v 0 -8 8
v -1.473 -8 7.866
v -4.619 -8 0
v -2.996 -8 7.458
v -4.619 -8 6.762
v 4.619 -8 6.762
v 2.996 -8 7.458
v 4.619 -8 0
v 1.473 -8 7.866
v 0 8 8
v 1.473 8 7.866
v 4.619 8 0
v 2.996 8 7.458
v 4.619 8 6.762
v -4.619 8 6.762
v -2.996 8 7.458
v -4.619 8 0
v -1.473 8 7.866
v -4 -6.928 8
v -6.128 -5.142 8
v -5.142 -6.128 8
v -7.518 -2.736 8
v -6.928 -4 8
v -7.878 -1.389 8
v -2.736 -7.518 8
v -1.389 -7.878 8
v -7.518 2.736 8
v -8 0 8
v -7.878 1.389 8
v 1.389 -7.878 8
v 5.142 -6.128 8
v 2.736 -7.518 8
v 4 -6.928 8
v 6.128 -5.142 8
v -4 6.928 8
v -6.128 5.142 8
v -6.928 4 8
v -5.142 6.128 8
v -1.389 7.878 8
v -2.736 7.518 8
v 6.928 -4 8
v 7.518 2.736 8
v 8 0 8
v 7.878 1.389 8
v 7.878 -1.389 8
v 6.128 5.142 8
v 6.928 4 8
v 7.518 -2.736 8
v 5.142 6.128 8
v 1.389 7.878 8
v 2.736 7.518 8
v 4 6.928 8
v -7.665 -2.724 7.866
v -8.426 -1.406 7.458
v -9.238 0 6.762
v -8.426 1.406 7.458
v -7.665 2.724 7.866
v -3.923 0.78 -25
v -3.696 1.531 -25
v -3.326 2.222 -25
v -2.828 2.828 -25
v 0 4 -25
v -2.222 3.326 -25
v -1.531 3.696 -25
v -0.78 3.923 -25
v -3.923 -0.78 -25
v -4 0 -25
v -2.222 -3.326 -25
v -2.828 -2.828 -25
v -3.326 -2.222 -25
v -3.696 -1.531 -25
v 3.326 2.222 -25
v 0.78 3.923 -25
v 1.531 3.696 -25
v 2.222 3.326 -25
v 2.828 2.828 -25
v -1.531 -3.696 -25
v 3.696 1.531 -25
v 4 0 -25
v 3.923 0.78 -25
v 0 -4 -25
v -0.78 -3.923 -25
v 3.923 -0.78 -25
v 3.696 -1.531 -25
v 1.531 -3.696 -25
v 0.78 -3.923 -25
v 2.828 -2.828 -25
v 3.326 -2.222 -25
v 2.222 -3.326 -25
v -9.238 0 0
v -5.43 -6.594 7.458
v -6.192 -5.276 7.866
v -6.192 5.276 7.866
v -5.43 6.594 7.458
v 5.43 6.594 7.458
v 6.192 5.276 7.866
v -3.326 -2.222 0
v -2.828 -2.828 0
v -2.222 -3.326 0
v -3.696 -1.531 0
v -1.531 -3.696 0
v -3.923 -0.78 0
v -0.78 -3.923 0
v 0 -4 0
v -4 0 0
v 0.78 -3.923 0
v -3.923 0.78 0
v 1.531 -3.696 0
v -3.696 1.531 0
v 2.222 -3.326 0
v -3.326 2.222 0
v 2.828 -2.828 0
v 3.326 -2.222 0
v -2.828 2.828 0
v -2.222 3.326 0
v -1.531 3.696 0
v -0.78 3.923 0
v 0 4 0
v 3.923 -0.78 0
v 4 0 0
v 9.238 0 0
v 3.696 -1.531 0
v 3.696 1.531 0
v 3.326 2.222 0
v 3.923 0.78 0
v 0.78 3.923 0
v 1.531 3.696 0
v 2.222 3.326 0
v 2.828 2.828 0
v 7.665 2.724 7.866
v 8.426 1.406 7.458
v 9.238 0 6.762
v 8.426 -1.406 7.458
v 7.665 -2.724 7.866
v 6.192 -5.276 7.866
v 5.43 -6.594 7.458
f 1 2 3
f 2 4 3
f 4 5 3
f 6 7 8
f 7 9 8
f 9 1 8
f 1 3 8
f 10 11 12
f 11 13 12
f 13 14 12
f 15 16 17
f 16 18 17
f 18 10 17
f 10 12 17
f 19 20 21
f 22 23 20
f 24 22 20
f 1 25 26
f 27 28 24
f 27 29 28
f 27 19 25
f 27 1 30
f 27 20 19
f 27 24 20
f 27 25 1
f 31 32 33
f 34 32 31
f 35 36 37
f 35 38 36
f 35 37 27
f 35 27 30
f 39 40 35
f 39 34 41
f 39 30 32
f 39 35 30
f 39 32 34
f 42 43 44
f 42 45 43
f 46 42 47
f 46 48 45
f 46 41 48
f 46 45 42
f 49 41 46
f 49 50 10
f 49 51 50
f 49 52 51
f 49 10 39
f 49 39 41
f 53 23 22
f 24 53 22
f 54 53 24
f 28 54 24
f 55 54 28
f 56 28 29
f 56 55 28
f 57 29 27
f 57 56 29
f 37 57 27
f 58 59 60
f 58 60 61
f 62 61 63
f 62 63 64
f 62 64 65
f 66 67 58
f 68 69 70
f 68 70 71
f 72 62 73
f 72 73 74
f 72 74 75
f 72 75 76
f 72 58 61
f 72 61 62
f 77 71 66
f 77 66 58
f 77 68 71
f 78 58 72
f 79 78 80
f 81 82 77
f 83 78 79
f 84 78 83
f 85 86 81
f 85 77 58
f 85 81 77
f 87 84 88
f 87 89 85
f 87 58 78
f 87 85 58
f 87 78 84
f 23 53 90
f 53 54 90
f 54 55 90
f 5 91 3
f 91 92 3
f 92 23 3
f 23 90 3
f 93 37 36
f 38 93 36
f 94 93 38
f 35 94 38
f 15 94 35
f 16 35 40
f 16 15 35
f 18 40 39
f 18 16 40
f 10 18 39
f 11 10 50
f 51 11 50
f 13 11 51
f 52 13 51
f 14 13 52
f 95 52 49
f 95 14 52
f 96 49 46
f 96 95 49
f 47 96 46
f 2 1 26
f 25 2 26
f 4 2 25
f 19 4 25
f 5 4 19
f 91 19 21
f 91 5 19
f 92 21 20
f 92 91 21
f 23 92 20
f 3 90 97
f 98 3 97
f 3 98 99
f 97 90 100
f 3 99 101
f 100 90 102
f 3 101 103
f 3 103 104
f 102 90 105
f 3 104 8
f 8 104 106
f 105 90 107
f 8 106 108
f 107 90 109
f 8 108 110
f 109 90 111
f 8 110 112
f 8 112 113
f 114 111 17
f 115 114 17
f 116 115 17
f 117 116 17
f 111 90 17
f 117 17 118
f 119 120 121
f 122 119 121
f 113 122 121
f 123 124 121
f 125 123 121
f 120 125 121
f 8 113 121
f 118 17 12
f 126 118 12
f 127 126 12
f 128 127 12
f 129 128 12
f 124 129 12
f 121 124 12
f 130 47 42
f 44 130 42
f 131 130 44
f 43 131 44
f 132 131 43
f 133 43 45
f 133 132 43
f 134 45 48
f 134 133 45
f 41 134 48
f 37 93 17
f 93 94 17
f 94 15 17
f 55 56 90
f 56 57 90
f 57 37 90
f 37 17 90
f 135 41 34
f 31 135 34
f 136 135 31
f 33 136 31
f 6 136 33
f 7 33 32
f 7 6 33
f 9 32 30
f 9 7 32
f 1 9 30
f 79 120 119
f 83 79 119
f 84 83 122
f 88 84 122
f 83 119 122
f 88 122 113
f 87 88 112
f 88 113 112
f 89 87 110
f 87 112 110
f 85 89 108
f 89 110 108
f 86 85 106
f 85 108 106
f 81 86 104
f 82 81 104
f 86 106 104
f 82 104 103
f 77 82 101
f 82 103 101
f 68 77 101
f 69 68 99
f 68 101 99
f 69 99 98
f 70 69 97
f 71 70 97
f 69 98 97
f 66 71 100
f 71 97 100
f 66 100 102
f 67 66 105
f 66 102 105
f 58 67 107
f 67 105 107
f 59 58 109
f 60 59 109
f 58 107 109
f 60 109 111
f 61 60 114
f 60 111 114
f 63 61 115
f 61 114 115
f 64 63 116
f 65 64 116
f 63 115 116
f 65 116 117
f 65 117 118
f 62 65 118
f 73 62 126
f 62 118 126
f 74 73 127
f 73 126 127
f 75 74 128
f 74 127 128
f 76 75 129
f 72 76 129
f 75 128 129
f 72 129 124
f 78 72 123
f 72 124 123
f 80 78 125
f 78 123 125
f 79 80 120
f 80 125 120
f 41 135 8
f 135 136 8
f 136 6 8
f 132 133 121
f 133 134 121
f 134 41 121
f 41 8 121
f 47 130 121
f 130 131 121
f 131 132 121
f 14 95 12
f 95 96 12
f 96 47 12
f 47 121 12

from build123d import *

# Parameters (mm, degrees)
BOSS_EXTRUDE1_DEPTH = 8
SKETCH2_OUTSIDE_W   = 41.62
SKETCH2_OUTSIDE_H   = 39.144
SKETCH2_OUTSIDE_R   = 8
CUT_EXTRUDE1_DEPTH  = 8
CUT_EXTRUDE1_TAPER  = 45
SKETCH3_R           = 4
BOSS_EXTRUDE2_DEPTH = 25


with BuildPart() as part:
    # Sketch1 → Boss-Extrude1 (new body)
    with BuildSketch(Plane.XY):
        Polygon((9.237604307, 0), (4.618802154, 8), (-4.618802154, 8), (-9.237604307, 0), (-4.618802154, -8), (4.618802154, -8), align=None)
    extrude(amount=BOSS_EXTRUDE1_DEPTH)

    # Sketch2 outside → Cut-Extrude1 (cut)
    with BuildSketch(Plane.XY.offset(8)):
        Rectangle(SKETCH2_OUTSIDE_W, SKETCH2_OUTSIDE_H)
        Circle(SKETCH2_OUTSIDE_R, mode=Mode.SUBTRACT)
    extrude(amount=-CUT_EXTRUDE1_DEPTH, taper=CUT_EXTRUDE1_TAPER, mode=Mode.SUBTRACT)

    # Sketch3 → Boss-Extrude2 (add)
    with BuildSketch(Plane(origin=(0, 0, 0), x_dir=(-1, 0, 0), z_dir=(0, 0, -1))):
        with Locations(Location((0, 0, 0), (0, 0, 180))):  # turned: the seam where the file's is
            Circle(SKETCH3_R)
    extrude(amount=BOSS_EXTRUDE2_DEPTH)


solid = part.part
